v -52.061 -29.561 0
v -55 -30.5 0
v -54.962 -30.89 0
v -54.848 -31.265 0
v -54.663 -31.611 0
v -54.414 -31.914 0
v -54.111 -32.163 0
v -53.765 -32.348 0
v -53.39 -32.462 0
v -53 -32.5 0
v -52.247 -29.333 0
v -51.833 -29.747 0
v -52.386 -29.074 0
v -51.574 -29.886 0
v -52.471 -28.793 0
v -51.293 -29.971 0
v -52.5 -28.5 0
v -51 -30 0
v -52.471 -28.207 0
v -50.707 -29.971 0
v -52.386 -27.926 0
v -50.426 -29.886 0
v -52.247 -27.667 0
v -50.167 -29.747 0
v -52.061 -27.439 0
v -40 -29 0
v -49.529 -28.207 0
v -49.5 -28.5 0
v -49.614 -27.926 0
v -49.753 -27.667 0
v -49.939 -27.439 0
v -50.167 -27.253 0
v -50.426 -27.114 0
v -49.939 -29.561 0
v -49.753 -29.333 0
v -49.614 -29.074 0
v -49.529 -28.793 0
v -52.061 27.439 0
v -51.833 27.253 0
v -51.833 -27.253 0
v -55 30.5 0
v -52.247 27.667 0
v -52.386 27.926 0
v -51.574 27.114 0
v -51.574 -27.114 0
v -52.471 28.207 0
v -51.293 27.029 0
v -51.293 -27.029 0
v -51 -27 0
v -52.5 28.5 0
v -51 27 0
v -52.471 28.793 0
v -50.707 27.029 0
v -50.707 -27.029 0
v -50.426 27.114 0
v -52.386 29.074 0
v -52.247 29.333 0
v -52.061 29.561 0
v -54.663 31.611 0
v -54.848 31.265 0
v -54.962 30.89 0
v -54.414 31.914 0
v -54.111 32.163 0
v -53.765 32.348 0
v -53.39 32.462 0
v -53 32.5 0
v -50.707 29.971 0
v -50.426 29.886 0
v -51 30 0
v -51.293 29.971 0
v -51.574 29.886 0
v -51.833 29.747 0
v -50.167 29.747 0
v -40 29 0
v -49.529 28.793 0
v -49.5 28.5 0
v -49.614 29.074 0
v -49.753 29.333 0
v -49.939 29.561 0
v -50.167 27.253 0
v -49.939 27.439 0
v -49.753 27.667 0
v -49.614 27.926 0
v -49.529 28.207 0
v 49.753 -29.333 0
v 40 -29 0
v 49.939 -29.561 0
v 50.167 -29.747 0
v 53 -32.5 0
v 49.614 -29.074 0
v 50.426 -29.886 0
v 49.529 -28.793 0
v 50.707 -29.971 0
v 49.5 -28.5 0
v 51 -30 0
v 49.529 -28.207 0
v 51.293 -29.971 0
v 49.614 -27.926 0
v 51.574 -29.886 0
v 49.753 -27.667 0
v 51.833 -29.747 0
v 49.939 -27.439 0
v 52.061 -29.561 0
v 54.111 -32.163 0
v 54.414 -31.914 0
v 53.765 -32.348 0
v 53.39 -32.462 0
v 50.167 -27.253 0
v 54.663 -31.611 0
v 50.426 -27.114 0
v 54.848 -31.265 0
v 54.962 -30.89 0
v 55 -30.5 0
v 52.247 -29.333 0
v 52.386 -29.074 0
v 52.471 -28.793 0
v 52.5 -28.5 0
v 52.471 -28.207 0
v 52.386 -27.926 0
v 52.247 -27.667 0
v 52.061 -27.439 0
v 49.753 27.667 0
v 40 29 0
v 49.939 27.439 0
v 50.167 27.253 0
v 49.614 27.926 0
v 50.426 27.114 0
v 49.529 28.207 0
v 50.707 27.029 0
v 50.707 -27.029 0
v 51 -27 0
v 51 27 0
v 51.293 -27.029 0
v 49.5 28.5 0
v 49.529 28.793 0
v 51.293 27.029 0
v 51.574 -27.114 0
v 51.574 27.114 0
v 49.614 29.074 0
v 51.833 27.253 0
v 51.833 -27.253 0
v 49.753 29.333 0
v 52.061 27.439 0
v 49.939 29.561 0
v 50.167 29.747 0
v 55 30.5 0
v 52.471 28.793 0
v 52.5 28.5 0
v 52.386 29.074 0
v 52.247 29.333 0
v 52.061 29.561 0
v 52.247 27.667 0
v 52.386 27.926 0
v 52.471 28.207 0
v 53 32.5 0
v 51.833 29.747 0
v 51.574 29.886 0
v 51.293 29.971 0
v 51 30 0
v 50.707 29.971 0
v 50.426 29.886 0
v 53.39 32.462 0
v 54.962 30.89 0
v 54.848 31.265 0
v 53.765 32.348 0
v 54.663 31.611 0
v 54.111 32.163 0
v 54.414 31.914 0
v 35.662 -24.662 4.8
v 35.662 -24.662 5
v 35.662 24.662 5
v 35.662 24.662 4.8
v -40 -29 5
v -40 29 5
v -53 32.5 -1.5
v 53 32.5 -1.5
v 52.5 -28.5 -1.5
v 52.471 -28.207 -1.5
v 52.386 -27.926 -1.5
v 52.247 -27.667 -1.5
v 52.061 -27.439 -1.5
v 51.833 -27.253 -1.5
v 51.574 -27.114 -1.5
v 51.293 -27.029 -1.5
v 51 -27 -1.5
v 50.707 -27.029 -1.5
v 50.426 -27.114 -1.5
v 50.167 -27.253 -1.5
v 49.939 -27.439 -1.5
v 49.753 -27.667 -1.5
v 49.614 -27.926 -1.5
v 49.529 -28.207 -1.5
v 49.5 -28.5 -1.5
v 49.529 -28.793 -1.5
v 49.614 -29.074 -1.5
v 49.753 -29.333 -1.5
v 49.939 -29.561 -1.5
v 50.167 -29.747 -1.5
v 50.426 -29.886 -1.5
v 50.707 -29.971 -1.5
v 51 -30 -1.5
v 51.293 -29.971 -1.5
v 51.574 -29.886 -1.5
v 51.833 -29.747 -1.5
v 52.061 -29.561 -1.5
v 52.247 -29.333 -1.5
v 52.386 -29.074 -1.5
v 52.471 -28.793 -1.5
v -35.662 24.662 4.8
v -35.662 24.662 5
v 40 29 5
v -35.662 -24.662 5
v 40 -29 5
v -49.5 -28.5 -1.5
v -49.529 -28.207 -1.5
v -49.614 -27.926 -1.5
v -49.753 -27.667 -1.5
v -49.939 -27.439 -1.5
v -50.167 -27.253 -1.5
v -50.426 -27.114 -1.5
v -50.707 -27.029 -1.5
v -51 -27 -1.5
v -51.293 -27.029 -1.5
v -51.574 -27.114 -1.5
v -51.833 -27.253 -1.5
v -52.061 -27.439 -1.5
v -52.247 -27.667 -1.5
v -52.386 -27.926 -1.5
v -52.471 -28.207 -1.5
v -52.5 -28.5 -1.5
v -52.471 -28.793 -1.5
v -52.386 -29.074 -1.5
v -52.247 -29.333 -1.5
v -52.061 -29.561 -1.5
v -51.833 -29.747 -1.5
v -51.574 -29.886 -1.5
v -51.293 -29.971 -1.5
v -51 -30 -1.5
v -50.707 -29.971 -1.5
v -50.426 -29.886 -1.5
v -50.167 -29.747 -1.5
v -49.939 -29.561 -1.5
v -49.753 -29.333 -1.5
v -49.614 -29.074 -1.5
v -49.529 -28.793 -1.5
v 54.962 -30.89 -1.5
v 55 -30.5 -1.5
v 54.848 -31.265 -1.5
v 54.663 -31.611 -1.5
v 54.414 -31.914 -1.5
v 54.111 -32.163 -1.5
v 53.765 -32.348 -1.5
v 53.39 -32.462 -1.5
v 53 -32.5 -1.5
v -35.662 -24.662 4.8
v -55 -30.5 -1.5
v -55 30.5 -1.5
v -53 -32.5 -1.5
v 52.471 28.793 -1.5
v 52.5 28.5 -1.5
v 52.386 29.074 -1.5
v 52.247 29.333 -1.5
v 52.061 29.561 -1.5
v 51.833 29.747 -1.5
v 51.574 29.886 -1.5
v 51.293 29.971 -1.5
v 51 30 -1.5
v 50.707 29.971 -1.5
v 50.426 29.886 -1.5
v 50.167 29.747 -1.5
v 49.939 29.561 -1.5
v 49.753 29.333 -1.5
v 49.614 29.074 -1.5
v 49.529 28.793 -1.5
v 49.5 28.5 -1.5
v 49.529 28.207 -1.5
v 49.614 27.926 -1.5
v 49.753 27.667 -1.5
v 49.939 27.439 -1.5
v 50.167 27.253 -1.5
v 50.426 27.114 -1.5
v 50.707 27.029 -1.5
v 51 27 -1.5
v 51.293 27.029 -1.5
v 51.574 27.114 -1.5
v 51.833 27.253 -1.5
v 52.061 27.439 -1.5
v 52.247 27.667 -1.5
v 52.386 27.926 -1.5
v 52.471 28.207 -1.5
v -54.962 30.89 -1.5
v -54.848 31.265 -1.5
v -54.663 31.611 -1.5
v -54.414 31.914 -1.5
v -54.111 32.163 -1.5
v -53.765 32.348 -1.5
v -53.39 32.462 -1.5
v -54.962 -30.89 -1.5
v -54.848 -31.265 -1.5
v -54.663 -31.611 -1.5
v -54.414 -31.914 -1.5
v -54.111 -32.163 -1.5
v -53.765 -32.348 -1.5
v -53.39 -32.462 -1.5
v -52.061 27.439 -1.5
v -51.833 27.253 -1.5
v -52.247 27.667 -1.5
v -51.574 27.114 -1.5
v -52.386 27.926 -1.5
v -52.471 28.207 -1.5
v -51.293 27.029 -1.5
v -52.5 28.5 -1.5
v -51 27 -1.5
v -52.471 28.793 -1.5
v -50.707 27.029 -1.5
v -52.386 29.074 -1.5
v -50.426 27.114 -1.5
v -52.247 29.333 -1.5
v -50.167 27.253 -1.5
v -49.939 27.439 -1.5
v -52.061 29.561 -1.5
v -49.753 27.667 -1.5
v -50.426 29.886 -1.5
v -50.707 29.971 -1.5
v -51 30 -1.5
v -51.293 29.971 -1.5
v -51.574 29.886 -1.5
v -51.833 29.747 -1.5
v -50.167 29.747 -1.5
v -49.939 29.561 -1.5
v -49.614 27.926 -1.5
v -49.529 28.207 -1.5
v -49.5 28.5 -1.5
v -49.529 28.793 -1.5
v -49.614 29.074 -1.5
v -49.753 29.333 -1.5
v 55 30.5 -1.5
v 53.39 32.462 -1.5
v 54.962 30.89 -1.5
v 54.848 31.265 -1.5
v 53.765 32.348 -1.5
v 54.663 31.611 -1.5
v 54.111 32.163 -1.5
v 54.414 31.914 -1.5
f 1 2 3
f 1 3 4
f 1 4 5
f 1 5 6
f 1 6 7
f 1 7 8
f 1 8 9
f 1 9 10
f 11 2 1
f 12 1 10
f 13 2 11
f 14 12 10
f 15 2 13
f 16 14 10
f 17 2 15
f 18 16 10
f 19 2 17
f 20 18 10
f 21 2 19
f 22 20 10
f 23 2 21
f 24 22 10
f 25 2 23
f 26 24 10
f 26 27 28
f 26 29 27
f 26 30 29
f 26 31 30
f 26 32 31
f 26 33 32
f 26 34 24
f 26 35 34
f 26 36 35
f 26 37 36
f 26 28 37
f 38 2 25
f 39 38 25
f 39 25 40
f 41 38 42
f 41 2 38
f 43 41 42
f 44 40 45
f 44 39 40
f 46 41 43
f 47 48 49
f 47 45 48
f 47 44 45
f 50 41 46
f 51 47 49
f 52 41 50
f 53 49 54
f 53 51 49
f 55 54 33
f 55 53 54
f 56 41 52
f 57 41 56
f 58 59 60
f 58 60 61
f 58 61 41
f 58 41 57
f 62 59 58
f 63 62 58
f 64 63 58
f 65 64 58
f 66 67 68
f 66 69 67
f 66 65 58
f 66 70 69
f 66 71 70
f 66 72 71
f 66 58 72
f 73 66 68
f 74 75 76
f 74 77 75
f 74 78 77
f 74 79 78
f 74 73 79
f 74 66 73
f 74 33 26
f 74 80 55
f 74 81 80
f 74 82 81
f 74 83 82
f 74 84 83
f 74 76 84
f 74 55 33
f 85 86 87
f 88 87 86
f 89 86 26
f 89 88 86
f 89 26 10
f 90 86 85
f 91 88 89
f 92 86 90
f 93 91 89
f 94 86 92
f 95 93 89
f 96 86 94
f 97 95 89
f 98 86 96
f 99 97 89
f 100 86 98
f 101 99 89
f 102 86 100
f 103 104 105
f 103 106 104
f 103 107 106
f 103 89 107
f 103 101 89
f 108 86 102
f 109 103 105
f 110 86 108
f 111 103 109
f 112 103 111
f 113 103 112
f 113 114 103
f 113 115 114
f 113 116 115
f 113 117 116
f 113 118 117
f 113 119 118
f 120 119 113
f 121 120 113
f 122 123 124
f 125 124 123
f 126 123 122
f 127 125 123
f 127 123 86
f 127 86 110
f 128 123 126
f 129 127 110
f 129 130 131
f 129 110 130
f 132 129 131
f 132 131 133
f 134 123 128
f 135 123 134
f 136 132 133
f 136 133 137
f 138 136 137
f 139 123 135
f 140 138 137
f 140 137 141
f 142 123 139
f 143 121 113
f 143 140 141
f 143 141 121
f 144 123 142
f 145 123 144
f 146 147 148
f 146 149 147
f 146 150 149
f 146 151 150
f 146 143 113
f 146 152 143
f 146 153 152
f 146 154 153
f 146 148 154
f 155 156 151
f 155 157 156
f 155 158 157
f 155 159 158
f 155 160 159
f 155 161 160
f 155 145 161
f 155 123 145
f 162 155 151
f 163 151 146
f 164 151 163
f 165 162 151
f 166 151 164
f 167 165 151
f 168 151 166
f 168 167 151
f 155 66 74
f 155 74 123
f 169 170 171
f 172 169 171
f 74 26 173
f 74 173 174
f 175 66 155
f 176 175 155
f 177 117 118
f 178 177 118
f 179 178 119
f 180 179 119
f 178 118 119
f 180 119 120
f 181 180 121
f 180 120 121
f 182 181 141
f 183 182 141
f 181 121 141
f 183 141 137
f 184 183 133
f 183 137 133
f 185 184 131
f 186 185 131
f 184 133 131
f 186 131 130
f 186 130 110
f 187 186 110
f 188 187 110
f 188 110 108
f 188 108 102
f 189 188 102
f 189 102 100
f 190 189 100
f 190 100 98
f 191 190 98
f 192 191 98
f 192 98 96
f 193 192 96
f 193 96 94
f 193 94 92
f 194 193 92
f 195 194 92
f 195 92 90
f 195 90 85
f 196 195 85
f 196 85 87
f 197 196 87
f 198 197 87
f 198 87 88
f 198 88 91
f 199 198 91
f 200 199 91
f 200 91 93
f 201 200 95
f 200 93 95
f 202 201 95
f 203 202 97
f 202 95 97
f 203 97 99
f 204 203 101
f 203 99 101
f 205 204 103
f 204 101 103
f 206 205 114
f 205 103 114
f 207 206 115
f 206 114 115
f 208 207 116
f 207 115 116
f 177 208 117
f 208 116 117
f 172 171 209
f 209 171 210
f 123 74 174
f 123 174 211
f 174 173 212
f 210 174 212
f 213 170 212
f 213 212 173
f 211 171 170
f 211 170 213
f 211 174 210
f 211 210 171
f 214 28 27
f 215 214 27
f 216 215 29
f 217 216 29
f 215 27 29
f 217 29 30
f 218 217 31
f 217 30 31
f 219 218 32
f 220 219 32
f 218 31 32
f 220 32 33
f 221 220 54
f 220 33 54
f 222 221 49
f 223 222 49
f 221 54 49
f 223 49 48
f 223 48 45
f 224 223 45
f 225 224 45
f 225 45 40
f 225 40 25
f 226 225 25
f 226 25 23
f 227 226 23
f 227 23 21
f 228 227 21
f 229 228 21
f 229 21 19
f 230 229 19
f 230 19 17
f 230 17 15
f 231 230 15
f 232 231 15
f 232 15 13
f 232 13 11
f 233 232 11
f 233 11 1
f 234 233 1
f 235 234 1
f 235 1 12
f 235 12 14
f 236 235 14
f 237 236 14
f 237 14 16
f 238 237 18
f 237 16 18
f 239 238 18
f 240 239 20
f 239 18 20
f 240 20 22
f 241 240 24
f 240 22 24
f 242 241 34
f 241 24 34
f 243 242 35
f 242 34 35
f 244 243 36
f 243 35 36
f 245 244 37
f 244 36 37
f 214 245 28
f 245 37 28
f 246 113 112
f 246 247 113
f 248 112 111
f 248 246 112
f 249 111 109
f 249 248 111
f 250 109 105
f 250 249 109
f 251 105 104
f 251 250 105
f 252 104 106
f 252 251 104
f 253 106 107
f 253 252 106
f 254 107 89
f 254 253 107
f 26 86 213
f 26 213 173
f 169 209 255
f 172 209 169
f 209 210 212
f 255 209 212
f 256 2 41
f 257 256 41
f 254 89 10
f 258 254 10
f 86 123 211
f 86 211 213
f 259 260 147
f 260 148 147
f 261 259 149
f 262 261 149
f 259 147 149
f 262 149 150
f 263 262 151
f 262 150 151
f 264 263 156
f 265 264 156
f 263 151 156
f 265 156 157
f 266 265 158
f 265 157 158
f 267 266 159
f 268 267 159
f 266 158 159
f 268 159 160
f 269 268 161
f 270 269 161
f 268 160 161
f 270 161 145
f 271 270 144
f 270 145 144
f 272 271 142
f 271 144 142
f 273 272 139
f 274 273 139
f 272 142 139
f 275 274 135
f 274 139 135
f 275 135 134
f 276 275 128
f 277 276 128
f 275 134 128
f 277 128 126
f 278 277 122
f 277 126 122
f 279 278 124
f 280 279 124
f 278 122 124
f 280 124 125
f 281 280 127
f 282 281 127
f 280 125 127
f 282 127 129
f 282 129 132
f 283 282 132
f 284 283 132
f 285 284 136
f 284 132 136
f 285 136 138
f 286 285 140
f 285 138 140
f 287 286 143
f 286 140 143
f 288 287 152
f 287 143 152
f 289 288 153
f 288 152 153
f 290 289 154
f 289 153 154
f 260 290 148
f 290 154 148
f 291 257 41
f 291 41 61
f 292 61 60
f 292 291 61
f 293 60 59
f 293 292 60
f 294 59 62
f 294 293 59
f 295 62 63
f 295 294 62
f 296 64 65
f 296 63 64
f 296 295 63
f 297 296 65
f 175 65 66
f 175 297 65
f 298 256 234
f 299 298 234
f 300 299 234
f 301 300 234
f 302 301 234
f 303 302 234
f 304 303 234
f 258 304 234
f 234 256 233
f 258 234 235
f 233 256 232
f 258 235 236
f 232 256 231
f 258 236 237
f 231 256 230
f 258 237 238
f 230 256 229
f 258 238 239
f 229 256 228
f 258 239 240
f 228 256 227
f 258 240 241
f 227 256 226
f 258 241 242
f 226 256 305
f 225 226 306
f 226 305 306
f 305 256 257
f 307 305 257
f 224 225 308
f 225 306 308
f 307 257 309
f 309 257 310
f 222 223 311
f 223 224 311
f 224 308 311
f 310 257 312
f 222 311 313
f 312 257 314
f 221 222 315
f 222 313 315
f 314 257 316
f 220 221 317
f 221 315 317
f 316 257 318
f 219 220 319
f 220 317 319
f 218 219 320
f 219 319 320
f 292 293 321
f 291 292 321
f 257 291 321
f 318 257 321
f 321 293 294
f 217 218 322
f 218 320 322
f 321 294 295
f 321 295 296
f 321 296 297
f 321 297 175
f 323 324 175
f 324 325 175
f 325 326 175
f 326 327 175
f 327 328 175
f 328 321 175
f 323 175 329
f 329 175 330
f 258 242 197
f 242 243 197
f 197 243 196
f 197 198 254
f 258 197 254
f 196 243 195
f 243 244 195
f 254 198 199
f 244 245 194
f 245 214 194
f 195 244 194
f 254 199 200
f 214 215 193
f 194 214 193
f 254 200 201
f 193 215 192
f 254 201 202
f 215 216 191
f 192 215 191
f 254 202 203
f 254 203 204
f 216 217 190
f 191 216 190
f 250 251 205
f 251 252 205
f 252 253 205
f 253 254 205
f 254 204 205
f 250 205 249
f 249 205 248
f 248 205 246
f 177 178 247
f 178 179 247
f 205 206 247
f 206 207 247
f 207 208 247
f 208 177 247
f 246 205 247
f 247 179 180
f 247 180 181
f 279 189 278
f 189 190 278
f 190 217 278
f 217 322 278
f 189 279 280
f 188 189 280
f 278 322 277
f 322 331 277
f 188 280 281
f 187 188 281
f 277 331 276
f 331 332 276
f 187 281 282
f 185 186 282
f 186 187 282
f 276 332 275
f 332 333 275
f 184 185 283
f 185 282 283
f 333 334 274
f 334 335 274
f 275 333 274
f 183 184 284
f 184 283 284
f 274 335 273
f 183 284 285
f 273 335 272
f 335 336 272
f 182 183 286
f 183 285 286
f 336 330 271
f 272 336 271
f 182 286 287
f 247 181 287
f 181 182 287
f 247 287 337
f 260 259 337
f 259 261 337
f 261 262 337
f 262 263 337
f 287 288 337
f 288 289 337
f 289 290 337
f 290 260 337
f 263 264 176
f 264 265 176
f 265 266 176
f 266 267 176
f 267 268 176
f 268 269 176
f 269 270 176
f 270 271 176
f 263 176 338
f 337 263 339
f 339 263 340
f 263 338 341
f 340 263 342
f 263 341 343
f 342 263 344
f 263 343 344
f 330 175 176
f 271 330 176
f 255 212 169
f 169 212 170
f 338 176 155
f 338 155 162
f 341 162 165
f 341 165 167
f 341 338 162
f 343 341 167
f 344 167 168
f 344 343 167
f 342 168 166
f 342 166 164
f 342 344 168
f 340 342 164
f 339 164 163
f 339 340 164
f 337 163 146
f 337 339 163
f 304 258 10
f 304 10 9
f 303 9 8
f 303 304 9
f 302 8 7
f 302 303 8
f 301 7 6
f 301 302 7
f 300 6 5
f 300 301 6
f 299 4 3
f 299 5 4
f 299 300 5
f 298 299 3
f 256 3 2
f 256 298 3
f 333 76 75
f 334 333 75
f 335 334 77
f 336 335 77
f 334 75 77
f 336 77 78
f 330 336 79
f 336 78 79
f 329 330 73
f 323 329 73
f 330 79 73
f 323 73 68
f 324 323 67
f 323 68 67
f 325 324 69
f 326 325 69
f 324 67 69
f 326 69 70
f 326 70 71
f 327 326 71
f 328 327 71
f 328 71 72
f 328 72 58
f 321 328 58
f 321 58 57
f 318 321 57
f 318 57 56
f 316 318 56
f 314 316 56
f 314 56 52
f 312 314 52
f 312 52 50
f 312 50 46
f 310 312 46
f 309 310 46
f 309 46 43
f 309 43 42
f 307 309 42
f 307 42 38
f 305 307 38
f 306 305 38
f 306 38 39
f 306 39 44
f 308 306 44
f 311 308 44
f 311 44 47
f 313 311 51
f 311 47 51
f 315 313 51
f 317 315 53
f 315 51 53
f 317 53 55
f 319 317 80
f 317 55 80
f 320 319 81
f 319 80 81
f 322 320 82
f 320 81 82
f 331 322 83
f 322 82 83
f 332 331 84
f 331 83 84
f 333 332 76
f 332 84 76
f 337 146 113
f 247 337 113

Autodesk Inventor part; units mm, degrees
ref_plane "YZ Plane" through (0, 0, 0) normal (1, 0, 0) x (0, 1, 0)
ref_plane "XZ Plane" through (0, 0, 0) normal (0, 1, 0) x (-1, 0, 0)
ref_plane "XY Plane" through (0, 0, 0) normal (0, 0, 1) x (1, 0, 0)
sketch "TFT LCD Touch Screen" plane through (0, 0, 0) normal (0, 0, 1) x (1, 0, 0)
  line L0 (-40, 29) -> (40, 29)
  line L1 (40, 29) -> (40, -29)
  line L2 (40, -29) -> (-40, -29)
  line L3 (-40, -29) -> (-40, 29)
  line L4 (-55, 32.5) -> (55, 32.5)
  line L5 (55, 32.5) -> (55, -32.5)
  line L6 (55, -32.5) -> (-55, -32.5)
  line L7 (-55, -32.5) -> (-55, 32.5)
  circle A0 centre (-51, 28.5) radius 1.5
  circle A1 centre (-51, -28.5) radius 1.5
  circle A2 centre (51, -28.5) radius 1.5
  circle A3 centre (51, 28.5) radius 1.5
  point P0 (0.75, 3.075)
  point P1 (0, 29)
  point P2 (-40, 0)
  point P3 (0, 32.5)
  point P4 (55, 0)
  dimension "d0" = 110
  dimension "d1" = 65
  dimension "d2" = 3
  dimension "d3" = 57
  dimension "d4" = 102
  dimension "d5" = 4
  dimension "d6" = 4
  dimension "d7" = 80
  dimension "d8" = 58
sketch "Sketch1" plane through (0, 0, 0) normal (0, 0, 1) x (1, 0, 0)
  line L0 (-40, 29) -> (40, 29)
  line L1 (40, 29) -> (40, -29)
  line L2 (40, -29) -> (-40, -29)
  line L3 (-40, -29) -> (-40, 29)
  line L4 (-55, 32.5) -> (55, 32.5)
  line L5 (55, 32.5) -> (55, -32.5)
  line L6 (55, -32.5) -> (-55, -32.5)
  line L7 (-55, -32.5) -> (-55, 32.5)
  circle A0 centre (-51, 28.5) radius 1.5
  circle A1 centre (-51, -28.5) radius 1.5
  circle A2 centre (51, -28.5) radius 1.5
  circle A3 centre (51, 28.5) radius 1.5
  point P0 (0, 0)
  point P1 (-55, 0)
extrude "Extrusion1" add sketch "Sketch1" against normal blind 1.5 contours L0 L1 L2 L3 | L4 L5 L6 L7
extrude "Extrusion2" add sketch "Sketch1" along normal blind 5 contours L0 L1 L2 L3
sketch "Sketch2" plane through (0, 0, 5) normal (0, 0, 1) x (1, 0, 0)
  line L0 (-40, 29) -> (40, 29)
  line L1 (40, 29) -> (40, -29)
  line L2 (40, -29) -> (-40, -29)
  line L3 (-40, -29) -> (-40, 29)
  line L4 (35.6625, 24.6625) -> (-35.6625, 24.6625)
  line L5 (-35.6625, 24.6625) -> (-35.6625, -24.6625)
  line L6 (-35.6625, -24.6625) -> (35.6625, -24.6625)
  line L7 (35.6625, -24.6625) -> (35.6625, 24.6625)
  point P0 (0, 0)
extrude "Extrusion3" cut sketch "Sketch2" against normal blind 0.2 contours L7 L6 L5 L4
fillet "Fillet1" radius 2 4 edges at (55, 32.5, -0.75) (-55, 32.5, -0.75) (-55, -32.5, -0.75) (55, -32.5, -0.75)
equation "\"d5\" = -0.5 * d3 + 0.5 * d1"
equation "\"d6\" = -0.5 * d4 + 0.5 * d0"
properties part number "TFT Screen"
